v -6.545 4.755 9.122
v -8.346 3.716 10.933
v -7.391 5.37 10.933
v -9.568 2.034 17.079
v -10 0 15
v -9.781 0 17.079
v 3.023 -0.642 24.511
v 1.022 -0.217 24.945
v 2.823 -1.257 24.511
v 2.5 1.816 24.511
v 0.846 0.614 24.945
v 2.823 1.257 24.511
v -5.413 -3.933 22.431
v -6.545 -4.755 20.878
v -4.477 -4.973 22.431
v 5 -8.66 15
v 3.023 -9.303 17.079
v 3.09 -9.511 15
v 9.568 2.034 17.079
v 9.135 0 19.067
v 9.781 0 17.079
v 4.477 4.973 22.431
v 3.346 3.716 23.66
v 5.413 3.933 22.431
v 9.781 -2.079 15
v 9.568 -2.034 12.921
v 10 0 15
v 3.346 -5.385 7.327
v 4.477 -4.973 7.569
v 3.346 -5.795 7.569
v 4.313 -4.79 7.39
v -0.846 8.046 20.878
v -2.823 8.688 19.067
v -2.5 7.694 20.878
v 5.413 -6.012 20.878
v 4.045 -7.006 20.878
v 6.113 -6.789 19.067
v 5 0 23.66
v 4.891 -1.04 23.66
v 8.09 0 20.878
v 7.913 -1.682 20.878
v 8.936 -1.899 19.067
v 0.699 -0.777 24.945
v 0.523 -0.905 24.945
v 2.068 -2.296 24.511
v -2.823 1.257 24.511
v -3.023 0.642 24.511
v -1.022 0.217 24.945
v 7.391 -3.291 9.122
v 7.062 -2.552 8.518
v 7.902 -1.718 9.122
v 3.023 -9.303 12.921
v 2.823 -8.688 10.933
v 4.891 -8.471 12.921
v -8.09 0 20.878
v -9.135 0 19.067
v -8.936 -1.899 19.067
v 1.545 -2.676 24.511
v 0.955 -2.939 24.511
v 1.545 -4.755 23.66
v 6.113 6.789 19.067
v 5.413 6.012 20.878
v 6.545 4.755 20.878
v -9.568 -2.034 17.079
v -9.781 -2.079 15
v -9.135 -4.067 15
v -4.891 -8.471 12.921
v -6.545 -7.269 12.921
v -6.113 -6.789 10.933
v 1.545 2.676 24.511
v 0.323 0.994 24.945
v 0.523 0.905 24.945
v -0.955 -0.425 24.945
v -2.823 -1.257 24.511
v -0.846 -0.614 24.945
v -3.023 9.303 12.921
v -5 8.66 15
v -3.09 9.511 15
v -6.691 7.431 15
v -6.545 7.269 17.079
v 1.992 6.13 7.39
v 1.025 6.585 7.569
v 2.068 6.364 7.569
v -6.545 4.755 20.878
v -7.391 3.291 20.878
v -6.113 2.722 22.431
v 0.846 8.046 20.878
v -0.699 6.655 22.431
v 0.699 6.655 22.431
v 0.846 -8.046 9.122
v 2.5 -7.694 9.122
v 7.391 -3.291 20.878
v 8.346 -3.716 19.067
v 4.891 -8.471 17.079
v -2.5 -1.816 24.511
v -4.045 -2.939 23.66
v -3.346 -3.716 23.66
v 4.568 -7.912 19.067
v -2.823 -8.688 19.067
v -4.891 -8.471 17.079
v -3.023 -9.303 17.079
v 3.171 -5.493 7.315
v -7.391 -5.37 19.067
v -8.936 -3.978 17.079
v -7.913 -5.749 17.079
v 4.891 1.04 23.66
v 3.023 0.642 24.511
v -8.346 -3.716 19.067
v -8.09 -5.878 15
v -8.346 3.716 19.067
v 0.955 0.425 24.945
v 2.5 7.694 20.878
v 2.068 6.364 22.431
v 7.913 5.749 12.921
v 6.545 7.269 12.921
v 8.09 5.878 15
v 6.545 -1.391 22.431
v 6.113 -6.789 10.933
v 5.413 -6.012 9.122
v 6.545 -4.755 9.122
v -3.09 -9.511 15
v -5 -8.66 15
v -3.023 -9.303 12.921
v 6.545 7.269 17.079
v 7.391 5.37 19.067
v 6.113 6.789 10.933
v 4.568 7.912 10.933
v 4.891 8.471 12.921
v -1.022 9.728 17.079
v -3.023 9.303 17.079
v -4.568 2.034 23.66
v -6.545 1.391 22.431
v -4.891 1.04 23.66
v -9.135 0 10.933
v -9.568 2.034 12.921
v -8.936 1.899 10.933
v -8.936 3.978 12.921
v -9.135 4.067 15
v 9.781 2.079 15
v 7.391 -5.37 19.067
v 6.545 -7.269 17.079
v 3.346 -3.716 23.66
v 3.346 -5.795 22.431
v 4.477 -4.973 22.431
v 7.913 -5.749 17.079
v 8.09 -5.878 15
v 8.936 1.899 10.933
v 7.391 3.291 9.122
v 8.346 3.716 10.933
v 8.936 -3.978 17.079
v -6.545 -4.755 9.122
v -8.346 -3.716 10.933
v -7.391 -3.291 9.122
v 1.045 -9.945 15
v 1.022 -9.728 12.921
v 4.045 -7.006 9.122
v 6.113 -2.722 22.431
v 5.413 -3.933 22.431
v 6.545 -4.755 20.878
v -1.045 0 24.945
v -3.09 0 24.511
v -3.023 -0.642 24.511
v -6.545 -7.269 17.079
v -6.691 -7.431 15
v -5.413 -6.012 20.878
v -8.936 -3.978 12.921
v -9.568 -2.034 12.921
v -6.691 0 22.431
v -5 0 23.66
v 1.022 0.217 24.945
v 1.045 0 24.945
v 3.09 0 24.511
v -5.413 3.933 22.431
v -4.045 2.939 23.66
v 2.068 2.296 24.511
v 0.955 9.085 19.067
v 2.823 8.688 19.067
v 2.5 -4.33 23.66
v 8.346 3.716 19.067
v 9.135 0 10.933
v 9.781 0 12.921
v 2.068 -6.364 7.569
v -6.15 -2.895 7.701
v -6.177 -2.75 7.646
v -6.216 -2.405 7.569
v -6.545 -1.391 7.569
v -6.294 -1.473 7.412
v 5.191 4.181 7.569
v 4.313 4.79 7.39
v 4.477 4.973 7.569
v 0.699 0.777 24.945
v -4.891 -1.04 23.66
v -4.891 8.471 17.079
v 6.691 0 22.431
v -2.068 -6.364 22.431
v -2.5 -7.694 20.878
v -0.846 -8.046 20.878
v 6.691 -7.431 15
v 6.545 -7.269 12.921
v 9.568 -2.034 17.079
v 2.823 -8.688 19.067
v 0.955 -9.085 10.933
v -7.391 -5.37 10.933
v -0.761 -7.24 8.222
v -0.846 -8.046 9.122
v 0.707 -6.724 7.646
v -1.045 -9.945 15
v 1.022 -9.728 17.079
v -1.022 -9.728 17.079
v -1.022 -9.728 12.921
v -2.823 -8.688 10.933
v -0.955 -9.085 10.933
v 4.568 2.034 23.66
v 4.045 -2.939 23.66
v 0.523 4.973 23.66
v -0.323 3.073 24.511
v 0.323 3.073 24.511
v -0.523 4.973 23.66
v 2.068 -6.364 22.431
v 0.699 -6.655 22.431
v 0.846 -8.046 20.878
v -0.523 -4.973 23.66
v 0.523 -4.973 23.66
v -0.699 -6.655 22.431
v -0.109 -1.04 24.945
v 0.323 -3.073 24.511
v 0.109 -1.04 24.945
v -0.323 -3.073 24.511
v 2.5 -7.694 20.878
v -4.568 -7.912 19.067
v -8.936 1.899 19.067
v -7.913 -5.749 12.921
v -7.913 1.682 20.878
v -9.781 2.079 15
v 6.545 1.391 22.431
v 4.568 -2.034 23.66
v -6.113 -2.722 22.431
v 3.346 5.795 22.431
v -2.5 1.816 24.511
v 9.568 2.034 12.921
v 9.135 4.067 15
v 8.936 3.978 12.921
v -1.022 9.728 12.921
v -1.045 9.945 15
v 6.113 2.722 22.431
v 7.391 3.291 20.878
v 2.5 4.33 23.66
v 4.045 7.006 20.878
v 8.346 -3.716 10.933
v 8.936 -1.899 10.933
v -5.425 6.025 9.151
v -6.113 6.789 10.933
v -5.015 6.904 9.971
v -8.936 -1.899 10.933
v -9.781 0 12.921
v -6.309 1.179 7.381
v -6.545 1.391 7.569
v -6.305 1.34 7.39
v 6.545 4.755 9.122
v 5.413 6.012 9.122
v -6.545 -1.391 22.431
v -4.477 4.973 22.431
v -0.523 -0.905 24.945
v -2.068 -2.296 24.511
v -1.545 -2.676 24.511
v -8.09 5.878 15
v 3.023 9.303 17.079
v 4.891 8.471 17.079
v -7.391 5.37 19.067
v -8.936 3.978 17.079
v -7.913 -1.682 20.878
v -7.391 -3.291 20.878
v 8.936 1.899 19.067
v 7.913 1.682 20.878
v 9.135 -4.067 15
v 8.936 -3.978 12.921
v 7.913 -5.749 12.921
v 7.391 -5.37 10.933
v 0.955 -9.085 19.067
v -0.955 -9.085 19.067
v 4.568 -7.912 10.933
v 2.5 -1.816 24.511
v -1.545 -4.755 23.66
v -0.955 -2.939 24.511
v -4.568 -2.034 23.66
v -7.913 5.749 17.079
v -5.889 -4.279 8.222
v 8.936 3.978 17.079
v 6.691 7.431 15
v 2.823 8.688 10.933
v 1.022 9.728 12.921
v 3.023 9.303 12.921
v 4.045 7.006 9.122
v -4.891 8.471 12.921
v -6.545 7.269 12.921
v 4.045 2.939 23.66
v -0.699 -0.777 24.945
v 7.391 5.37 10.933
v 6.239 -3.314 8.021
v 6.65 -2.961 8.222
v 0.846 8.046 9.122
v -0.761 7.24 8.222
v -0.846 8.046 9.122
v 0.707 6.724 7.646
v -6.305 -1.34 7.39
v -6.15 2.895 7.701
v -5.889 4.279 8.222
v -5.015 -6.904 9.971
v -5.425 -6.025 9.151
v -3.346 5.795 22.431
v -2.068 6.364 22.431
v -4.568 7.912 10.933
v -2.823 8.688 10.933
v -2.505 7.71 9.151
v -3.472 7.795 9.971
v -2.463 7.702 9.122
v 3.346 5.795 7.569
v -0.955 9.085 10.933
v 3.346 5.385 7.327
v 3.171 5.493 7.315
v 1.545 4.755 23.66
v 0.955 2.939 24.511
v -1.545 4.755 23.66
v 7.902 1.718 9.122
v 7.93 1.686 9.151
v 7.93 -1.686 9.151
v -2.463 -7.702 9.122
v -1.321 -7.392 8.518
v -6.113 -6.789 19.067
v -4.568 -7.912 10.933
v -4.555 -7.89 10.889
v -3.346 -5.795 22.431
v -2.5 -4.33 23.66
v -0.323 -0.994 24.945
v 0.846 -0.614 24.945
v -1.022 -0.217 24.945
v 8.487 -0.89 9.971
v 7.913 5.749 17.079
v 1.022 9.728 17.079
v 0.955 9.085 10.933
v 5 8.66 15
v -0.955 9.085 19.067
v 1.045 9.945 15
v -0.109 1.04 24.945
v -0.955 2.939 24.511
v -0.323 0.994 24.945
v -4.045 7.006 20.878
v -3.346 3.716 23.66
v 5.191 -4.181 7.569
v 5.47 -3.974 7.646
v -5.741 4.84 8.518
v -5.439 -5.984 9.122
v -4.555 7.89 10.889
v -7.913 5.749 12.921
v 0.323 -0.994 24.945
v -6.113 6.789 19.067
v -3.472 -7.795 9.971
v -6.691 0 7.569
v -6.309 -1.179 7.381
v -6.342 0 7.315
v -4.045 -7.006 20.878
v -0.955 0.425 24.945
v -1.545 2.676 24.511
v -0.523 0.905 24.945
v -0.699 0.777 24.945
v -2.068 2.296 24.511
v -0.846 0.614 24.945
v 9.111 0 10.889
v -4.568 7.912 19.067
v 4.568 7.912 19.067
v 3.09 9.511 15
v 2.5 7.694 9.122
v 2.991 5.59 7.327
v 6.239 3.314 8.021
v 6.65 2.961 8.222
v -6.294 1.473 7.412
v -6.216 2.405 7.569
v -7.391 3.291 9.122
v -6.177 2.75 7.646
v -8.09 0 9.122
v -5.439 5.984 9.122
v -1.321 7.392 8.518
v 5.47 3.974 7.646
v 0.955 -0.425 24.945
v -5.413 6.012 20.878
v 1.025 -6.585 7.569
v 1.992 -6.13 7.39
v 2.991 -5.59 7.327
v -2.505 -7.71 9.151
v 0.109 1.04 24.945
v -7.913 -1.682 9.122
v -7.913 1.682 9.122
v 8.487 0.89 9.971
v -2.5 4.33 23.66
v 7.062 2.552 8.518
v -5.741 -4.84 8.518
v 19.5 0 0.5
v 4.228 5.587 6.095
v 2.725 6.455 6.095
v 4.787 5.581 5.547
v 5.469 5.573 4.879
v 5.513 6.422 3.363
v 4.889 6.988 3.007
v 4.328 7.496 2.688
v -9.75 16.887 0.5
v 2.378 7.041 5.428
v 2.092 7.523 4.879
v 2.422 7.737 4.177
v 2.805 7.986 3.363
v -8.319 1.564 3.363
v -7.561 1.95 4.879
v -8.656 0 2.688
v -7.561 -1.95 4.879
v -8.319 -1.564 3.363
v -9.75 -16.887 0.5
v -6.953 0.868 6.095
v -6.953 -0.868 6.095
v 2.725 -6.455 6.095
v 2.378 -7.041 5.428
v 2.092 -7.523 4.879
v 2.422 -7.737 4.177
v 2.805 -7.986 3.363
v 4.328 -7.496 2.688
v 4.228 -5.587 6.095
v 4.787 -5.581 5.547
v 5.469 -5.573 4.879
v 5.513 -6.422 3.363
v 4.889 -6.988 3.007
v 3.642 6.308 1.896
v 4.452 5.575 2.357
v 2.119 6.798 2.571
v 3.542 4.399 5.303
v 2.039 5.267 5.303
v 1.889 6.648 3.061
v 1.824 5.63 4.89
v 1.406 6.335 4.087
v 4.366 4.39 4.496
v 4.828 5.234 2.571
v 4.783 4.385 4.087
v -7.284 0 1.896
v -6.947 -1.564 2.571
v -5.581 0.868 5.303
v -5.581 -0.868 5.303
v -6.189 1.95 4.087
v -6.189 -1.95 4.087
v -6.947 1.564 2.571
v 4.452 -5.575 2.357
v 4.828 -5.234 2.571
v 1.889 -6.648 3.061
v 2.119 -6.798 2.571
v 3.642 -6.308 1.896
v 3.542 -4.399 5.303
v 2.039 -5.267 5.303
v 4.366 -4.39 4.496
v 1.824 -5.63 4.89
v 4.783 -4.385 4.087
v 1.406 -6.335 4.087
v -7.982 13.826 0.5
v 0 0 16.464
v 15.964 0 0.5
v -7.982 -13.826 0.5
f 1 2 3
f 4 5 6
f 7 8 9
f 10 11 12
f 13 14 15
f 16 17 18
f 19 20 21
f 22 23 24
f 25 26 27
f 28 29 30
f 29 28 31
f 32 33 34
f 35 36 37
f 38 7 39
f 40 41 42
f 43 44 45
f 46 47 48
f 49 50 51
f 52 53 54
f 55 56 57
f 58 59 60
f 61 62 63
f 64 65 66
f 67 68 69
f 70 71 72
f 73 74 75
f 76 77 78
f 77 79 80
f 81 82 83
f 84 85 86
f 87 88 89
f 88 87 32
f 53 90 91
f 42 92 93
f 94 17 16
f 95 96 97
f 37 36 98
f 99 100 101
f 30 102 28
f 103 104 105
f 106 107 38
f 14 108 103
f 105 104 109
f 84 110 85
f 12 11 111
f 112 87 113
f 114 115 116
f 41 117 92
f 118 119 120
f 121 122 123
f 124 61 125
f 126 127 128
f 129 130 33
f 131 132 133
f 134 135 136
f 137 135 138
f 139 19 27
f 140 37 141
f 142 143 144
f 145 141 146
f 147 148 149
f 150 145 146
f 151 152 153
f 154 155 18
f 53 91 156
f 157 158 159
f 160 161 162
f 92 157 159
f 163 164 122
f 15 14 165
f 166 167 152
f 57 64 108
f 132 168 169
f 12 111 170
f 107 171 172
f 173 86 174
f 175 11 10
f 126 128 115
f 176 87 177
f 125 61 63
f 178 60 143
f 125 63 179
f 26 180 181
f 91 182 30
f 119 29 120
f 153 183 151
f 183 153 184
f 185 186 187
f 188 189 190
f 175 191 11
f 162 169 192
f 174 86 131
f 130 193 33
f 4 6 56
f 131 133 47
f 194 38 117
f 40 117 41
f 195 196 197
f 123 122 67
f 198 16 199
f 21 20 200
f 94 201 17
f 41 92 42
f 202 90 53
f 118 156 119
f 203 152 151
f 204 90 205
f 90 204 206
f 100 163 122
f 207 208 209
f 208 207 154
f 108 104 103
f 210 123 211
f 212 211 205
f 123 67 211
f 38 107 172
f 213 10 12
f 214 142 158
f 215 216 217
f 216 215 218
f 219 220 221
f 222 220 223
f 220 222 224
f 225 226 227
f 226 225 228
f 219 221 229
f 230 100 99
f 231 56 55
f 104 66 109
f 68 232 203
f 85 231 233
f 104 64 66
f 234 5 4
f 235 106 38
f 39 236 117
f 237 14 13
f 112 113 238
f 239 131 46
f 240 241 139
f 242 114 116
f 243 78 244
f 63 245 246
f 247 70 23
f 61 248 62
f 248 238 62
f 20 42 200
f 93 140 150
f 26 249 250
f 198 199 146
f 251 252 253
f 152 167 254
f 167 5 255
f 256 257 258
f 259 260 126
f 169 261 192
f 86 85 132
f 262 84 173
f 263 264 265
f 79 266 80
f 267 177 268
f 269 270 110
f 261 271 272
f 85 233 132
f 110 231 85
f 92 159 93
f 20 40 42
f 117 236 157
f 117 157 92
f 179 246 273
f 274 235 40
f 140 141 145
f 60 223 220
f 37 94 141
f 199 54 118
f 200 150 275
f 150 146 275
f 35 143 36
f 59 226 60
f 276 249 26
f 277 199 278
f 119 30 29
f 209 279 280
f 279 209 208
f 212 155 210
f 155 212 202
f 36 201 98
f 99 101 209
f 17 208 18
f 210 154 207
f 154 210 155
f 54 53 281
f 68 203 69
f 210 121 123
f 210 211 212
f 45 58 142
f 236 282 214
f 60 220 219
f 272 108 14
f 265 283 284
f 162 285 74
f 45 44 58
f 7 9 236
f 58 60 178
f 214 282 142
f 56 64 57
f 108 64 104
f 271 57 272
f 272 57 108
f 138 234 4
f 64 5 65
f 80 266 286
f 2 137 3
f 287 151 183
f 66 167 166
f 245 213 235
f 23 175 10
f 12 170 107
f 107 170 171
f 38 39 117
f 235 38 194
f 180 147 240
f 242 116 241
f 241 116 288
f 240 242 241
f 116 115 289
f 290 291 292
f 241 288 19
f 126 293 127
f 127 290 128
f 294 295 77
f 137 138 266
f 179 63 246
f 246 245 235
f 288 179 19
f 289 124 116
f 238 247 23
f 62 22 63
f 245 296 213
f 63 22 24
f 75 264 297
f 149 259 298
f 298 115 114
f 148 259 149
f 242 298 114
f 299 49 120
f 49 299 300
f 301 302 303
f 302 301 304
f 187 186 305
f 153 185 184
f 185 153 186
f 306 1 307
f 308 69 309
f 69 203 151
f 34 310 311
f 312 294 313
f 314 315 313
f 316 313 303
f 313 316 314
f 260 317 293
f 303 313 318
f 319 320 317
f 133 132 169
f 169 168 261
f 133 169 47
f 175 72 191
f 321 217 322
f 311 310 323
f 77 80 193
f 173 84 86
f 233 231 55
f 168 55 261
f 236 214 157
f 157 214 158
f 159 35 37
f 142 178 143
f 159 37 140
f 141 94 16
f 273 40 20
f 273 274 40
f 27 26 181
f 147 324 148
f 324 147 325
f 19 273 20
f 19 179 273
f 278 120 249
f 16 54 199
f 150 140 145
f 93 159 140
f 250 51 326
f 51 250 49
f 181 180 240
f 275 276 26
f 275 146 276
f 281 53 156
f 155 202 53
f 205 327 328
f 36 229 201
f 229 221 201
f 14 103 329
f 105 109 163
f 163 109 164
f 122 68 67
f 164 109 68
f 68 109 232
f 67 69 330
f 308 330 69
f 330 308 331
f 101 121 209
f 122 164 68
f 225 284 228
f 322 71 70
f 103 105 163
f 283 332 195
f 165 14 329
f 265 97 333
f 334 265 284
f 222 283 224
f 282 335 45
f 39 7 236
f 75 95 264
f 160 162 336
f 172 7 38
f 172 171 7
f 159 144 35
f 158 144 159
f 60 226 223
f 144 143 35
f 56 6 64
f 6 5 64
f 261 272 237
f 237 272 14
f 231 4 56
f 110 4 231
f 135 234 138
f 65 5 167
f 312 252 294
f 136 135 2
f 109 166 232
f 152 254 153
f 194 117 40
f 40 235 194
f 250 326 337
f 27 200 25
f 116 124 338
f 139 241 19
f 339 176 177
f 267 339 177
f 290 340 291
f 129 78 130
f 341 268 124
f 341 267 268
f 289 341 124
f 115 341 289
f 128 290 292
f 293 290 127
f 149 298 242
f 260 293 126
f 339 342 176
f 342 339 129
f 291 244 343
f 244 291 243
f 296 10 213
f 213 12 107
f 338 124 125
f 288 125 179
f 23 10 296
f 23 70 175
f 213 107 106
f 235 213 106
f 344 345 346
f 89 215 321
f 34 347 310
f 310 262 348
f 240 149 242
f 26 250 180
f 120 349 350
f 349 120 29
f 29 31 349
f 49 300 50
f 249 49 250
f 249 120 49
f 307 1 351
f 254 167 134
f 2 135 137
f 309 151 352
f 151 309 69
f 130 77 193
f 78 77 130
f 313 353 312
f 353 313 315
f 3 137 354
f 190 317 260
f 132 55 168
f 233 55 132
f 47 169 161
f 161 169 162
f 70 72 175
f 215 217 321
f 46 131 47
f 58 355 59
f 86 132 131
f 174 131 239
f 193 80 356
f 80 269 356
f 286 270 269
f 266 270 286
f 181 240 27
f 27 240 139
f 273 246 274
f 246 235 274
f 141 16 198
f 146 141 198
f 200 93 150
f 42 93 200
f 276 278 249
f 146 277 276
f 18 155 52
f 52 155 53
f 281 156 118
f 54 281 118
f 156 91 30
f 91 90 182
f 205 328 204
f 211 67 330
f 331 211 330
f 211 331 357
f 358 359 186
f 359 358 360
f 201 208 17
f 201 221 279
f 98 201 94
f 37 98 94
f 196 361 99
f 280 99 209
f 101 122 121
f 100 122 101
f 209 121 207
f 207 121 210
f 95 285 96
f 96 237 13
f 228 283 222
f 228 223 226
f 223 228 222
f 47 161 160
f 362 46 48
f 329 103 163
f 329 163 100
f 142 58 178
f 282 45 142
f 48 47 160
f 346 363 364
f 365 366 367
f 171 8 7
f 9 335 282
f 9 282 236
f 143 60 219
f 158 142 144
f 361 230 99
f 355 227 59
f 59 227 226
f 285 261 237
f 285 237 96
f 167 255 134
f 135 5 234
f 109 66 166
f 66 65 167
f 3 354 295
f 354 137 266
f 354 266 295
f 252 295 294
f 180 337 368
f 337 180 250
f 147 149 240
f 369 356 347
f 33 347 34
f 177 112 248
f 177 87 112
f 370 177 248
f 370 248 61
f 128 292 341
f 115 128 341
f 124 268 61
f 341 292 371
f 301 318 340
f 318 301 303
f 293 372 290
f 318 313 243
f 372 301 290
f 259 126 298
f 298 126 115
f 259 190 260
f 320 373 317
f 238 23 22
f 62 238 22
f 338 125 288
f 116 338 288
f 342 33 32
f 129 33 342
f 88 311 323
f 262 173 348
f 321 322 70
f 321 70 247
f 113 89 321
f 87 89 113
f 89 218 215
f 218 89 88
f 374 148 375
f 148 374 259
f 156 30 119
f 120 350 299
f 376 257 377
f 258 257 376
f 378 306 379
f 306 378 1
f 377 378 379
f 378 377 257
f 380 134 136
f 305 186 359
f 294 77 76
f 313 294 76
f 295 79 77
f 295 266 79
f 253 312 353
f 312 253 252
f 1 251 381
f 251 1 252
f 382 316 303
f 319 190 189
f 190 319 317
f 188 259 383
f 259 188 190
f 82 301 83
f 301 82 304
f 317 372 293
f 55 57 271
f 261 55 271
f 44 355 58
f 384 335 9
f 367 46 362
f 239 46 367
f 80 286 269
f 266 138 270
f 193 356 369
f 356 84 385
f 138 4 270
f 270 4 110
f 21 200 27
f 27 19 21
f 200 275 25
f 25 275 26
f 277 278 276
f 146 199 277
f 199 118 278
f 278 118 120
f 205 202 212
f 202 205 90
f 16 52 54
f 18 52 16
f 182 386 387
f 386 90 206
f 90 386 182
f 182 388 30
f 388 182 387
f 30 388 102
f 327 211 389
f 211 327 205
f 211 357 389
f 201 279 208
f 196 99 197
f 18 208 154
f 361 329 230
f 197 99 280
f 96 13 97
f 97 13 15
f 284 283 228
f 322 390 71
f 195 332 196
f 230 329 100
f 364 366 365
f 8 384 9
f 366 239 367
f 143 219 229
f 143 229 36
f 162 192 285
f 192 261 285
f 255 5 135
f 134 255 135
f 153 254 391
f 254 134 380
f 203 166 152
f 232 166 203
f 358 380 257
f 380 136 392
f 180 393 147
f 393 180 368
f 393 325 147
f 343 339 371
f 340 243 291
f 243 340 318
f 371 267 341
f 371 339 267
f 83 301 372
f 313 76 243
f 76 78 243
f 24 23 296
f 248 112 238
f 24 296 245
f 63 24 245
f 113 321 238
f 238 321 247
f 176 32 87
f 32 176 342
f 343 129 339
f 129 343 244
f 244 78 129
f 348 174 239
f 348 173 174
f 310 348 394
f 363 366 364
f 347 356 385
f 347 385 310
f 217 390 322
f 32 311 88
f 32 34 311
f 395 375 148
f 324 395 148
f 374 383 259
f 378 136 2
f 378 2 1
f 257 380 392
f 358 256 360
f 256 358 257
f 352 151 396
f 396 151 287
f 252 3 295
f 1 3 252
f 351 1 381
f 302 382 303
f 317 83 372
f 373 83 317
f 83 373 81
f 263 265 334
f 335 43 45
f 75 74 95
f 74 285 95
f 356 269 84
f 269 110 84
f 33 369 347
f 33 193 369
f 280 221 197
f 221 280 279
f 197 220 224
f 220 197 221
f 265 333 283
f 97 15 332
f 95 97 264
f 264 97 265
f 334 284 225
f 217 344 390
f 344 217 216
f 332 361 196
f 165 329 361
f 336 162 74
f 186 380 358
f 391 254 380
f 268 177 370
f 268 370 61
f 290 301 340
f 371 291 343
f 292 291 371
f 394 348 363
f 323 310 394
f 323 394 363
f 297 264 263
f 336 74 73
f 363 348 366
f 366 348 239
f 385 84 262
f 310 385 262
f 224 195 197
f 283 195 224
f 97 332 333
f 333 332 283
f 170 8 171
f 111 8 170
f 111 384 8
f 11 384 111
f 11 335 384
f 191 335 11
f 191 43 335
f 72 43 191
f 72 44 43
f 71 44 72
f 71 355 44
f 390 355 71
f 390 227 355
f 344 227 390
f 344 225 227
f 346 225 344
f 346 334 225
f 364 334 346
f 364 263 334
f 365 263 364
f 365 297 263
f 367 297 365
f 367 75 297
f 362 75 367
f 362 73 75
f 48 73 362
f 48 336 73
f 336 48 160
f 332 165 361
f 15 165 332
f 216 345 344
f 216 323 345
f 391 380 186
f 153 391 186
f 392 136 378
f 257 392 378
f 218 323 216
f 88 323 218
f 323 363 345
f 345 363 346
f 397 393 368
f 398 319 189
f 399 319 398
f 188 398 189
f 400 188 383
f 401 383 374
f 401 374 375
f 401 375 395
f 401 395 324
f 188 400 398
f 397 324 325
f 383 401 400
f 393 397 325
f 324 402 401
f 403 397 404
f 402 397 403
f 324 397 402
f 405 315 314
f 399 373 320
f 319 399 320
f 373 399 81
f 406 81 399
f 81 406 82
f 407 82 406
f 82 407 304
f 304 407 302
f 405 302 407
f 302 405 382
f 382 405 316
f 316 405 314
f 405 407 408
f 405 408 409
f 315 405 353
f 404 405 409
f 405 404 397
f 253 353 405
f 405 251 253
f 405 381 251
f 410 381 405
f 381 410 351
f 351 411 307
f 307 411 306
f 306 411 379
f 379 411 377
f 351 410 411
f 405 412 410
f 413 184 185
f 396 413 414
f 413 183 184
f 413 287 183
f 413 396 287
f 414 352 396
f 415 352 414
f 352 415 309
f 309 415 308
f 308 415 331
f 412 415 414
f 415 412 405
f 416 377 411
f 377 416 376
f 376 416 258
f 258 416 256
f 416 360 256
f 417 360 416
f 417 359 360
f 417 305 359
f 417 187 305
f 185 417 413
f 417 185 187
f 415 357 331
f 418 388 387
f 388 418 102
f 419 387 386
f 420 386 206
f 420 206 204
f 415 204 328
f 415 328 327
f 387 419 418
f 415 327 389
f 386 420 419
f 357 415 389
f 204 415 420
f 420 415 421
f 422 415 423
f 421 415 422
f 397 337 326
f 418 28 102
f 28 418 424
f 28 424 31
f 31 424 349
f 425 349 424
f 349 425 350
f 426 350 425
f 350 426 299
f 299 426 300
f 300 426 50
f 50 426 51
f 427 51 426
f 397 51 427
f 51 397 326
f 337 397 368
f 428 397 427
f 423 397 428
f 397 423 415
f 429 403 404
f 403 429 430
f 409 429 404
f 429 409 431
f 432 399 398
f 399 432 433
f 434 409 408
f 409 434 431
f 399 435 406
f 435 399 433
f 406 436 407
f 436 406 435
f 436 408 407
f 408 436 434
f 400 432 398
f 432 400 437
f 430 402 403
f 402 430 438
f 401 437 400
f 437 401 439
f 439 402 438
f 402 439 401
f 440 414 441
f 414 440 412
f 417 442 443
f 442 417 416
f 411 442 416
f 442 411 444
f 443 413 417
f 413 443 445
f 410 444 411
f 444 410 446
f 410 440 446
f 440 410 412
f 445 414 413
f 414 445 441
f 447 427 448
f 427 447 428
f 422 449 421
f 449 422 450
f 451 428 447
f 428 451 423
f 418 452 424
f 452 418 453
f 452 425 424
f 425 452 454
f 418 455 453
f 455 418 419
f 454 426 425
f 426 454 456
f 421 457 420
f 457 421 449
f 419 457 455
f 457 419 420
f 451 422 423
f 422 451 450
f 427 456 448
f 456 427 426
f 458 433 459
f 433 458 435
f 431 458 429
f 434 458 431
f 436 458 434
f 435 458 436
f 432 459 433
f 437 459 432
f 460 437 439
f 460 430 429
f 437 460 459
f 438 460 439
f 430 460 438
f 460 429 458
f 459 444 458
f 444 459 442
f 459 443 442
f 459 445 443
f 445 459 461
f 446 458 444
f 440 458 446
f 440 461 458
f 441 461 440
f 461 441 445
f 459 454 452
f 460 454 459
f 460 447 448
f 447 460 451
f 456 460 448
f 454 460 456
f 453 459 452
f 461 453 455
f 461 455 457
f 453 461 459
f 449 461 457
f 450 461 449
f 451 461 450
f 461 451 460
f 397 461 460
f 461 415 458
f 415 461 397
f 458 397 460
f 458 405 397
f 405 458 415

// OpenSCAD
// [FL_INDEX: keywords="openscad, 3d_parametric, Ball_Corner_Case_Guard, csg_solid" | COT="Parametric OpenSCAD design from 3DCodeverse"]
// Title: Ball Corner Case Guard


r = 10;
r2 = 2 * r;

d = 2.5;
s = 4;

difference()
{
	union()
	{
		translate( [ 0, 0, r2*3/4 ] )
			sphere( r = r, center = true );
		translate( [ 0, 0, r2/2 ] )
			cylinder( r1 = r2, r2 = 0, h = r2, center = true, $fn = 3 );
	}

	translate( [ 0, 0, r2/2-d*sqrt(2) ] )
		cylinder( r1 = r2, r2 = 0, h = r2, center = true, $fn = 3 );

	cube( [ r*4, r*4, 1 ], center = true );

	for ( a = [ 0, 120, 240 ] ) rotate( a+60, [ 0, 0, 1 ] )
		translate( [ r2*cos(60), 0, 0 ] )
			rotate( [ 0, 60, 0 ] )
				translate( [ -1.25*s, 0, 0 ] )
			cylinder( r = s/2, h = d*3, center = true );
}
